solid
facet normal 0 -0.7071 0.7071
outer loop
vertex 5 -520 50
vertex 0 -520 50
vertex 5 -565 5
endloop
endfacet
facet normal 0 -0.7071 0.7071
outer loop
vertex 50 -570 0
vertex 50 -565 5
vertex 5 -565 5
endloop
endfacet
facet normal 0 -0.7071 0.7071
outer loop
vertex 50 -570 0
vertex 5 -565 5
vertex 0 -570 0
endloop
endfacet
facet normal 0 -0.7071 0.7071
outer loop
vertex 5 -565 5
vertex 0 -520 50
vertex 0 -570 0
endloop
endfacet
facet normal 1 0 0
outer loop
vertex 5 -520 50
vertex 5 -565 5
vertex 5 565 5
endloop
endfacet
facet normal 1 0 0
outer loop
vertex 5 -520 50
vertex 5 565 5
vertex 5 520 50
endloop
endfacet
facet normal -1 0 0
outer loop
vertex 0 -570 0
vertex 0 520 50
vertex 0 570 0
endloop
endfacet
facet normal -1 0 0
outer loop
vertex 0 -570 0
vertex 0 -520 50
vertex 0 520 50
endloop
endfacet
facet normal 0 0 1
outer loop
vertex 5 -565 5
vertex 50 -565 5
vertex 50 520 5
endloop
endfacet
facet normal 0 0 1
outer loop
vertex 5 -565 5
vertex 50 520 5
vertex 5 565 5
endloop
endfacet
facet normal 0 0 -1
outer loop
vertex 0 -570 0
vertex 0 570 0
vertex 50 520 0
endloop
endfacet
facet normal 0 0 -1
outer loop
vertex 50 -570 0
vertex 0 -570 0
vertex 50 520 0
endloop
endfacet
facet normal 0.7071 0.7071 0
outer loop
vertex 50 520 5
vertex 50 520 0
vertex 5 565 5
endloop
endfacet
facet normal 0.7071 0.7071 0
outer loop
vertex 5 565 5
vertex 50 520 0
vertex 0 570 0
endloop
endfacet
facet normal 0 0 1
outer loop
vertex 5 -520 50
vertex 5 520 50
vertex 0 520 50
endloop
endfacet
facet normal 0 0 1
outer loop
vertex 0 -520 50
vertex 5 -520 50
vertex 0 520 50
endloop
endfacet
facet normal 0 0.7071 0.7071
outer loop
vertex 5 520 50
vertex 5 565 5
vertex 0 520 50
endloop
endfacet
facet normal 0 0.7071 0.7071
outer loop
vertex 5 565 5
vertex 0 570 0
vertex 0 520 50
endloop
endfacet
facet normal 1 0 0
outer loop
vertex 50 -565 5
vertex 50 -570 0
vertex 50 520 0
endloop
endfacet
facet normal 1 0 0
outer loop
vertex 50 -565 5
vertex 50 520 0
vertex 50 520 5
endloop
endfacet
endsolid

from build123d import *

# Parameters (mm, degrees)
F1_DEPTH = 570
F3_DEPTH = 50
F5_DEPTH = 50


# Not quite as in the source:
# - a feature names something its author has since deleted; it is built from what else it names


with BuildPart() as f1:
    # F0 (on Front) → F1 (new body, symmetric)
    with BuildSketch(Plane.XZ):
        Polygon((0, 50), (0, 0), (50, 0), (50, 5), (5, 5), (5, 50), align=None)
    extrude(amount=F1_DEPTH, both=True)

    # F2 (on face) → F3 (cut)
    with BuildSketch(Plane(origin=(0, 0, 0), x_dir=(0, -1, 0), z_dir=(-1, 0, 0))):
        Polygon((-570, 50), (-570, 0), (-520, 50), align=None)
        Polygon((520, 50), (570, 0), (570, 50), align=None)
    extrude(amount=-F3_DEPTH, mode=Mode.SUBTRACT)

    # F4 (on face) → F5 (cut)
    with BuildSketch(Plane(origin=(0, 0, 0), x_dir=(1, 0, 0), z_dir=(0, 0, -1))):
        Polygon((50, -520), (0, -570), (50, -570), align=None)
    extrude(amount=-F5_DEPTH, mode=Mode.SUBTRACT)


solid = f1.part
